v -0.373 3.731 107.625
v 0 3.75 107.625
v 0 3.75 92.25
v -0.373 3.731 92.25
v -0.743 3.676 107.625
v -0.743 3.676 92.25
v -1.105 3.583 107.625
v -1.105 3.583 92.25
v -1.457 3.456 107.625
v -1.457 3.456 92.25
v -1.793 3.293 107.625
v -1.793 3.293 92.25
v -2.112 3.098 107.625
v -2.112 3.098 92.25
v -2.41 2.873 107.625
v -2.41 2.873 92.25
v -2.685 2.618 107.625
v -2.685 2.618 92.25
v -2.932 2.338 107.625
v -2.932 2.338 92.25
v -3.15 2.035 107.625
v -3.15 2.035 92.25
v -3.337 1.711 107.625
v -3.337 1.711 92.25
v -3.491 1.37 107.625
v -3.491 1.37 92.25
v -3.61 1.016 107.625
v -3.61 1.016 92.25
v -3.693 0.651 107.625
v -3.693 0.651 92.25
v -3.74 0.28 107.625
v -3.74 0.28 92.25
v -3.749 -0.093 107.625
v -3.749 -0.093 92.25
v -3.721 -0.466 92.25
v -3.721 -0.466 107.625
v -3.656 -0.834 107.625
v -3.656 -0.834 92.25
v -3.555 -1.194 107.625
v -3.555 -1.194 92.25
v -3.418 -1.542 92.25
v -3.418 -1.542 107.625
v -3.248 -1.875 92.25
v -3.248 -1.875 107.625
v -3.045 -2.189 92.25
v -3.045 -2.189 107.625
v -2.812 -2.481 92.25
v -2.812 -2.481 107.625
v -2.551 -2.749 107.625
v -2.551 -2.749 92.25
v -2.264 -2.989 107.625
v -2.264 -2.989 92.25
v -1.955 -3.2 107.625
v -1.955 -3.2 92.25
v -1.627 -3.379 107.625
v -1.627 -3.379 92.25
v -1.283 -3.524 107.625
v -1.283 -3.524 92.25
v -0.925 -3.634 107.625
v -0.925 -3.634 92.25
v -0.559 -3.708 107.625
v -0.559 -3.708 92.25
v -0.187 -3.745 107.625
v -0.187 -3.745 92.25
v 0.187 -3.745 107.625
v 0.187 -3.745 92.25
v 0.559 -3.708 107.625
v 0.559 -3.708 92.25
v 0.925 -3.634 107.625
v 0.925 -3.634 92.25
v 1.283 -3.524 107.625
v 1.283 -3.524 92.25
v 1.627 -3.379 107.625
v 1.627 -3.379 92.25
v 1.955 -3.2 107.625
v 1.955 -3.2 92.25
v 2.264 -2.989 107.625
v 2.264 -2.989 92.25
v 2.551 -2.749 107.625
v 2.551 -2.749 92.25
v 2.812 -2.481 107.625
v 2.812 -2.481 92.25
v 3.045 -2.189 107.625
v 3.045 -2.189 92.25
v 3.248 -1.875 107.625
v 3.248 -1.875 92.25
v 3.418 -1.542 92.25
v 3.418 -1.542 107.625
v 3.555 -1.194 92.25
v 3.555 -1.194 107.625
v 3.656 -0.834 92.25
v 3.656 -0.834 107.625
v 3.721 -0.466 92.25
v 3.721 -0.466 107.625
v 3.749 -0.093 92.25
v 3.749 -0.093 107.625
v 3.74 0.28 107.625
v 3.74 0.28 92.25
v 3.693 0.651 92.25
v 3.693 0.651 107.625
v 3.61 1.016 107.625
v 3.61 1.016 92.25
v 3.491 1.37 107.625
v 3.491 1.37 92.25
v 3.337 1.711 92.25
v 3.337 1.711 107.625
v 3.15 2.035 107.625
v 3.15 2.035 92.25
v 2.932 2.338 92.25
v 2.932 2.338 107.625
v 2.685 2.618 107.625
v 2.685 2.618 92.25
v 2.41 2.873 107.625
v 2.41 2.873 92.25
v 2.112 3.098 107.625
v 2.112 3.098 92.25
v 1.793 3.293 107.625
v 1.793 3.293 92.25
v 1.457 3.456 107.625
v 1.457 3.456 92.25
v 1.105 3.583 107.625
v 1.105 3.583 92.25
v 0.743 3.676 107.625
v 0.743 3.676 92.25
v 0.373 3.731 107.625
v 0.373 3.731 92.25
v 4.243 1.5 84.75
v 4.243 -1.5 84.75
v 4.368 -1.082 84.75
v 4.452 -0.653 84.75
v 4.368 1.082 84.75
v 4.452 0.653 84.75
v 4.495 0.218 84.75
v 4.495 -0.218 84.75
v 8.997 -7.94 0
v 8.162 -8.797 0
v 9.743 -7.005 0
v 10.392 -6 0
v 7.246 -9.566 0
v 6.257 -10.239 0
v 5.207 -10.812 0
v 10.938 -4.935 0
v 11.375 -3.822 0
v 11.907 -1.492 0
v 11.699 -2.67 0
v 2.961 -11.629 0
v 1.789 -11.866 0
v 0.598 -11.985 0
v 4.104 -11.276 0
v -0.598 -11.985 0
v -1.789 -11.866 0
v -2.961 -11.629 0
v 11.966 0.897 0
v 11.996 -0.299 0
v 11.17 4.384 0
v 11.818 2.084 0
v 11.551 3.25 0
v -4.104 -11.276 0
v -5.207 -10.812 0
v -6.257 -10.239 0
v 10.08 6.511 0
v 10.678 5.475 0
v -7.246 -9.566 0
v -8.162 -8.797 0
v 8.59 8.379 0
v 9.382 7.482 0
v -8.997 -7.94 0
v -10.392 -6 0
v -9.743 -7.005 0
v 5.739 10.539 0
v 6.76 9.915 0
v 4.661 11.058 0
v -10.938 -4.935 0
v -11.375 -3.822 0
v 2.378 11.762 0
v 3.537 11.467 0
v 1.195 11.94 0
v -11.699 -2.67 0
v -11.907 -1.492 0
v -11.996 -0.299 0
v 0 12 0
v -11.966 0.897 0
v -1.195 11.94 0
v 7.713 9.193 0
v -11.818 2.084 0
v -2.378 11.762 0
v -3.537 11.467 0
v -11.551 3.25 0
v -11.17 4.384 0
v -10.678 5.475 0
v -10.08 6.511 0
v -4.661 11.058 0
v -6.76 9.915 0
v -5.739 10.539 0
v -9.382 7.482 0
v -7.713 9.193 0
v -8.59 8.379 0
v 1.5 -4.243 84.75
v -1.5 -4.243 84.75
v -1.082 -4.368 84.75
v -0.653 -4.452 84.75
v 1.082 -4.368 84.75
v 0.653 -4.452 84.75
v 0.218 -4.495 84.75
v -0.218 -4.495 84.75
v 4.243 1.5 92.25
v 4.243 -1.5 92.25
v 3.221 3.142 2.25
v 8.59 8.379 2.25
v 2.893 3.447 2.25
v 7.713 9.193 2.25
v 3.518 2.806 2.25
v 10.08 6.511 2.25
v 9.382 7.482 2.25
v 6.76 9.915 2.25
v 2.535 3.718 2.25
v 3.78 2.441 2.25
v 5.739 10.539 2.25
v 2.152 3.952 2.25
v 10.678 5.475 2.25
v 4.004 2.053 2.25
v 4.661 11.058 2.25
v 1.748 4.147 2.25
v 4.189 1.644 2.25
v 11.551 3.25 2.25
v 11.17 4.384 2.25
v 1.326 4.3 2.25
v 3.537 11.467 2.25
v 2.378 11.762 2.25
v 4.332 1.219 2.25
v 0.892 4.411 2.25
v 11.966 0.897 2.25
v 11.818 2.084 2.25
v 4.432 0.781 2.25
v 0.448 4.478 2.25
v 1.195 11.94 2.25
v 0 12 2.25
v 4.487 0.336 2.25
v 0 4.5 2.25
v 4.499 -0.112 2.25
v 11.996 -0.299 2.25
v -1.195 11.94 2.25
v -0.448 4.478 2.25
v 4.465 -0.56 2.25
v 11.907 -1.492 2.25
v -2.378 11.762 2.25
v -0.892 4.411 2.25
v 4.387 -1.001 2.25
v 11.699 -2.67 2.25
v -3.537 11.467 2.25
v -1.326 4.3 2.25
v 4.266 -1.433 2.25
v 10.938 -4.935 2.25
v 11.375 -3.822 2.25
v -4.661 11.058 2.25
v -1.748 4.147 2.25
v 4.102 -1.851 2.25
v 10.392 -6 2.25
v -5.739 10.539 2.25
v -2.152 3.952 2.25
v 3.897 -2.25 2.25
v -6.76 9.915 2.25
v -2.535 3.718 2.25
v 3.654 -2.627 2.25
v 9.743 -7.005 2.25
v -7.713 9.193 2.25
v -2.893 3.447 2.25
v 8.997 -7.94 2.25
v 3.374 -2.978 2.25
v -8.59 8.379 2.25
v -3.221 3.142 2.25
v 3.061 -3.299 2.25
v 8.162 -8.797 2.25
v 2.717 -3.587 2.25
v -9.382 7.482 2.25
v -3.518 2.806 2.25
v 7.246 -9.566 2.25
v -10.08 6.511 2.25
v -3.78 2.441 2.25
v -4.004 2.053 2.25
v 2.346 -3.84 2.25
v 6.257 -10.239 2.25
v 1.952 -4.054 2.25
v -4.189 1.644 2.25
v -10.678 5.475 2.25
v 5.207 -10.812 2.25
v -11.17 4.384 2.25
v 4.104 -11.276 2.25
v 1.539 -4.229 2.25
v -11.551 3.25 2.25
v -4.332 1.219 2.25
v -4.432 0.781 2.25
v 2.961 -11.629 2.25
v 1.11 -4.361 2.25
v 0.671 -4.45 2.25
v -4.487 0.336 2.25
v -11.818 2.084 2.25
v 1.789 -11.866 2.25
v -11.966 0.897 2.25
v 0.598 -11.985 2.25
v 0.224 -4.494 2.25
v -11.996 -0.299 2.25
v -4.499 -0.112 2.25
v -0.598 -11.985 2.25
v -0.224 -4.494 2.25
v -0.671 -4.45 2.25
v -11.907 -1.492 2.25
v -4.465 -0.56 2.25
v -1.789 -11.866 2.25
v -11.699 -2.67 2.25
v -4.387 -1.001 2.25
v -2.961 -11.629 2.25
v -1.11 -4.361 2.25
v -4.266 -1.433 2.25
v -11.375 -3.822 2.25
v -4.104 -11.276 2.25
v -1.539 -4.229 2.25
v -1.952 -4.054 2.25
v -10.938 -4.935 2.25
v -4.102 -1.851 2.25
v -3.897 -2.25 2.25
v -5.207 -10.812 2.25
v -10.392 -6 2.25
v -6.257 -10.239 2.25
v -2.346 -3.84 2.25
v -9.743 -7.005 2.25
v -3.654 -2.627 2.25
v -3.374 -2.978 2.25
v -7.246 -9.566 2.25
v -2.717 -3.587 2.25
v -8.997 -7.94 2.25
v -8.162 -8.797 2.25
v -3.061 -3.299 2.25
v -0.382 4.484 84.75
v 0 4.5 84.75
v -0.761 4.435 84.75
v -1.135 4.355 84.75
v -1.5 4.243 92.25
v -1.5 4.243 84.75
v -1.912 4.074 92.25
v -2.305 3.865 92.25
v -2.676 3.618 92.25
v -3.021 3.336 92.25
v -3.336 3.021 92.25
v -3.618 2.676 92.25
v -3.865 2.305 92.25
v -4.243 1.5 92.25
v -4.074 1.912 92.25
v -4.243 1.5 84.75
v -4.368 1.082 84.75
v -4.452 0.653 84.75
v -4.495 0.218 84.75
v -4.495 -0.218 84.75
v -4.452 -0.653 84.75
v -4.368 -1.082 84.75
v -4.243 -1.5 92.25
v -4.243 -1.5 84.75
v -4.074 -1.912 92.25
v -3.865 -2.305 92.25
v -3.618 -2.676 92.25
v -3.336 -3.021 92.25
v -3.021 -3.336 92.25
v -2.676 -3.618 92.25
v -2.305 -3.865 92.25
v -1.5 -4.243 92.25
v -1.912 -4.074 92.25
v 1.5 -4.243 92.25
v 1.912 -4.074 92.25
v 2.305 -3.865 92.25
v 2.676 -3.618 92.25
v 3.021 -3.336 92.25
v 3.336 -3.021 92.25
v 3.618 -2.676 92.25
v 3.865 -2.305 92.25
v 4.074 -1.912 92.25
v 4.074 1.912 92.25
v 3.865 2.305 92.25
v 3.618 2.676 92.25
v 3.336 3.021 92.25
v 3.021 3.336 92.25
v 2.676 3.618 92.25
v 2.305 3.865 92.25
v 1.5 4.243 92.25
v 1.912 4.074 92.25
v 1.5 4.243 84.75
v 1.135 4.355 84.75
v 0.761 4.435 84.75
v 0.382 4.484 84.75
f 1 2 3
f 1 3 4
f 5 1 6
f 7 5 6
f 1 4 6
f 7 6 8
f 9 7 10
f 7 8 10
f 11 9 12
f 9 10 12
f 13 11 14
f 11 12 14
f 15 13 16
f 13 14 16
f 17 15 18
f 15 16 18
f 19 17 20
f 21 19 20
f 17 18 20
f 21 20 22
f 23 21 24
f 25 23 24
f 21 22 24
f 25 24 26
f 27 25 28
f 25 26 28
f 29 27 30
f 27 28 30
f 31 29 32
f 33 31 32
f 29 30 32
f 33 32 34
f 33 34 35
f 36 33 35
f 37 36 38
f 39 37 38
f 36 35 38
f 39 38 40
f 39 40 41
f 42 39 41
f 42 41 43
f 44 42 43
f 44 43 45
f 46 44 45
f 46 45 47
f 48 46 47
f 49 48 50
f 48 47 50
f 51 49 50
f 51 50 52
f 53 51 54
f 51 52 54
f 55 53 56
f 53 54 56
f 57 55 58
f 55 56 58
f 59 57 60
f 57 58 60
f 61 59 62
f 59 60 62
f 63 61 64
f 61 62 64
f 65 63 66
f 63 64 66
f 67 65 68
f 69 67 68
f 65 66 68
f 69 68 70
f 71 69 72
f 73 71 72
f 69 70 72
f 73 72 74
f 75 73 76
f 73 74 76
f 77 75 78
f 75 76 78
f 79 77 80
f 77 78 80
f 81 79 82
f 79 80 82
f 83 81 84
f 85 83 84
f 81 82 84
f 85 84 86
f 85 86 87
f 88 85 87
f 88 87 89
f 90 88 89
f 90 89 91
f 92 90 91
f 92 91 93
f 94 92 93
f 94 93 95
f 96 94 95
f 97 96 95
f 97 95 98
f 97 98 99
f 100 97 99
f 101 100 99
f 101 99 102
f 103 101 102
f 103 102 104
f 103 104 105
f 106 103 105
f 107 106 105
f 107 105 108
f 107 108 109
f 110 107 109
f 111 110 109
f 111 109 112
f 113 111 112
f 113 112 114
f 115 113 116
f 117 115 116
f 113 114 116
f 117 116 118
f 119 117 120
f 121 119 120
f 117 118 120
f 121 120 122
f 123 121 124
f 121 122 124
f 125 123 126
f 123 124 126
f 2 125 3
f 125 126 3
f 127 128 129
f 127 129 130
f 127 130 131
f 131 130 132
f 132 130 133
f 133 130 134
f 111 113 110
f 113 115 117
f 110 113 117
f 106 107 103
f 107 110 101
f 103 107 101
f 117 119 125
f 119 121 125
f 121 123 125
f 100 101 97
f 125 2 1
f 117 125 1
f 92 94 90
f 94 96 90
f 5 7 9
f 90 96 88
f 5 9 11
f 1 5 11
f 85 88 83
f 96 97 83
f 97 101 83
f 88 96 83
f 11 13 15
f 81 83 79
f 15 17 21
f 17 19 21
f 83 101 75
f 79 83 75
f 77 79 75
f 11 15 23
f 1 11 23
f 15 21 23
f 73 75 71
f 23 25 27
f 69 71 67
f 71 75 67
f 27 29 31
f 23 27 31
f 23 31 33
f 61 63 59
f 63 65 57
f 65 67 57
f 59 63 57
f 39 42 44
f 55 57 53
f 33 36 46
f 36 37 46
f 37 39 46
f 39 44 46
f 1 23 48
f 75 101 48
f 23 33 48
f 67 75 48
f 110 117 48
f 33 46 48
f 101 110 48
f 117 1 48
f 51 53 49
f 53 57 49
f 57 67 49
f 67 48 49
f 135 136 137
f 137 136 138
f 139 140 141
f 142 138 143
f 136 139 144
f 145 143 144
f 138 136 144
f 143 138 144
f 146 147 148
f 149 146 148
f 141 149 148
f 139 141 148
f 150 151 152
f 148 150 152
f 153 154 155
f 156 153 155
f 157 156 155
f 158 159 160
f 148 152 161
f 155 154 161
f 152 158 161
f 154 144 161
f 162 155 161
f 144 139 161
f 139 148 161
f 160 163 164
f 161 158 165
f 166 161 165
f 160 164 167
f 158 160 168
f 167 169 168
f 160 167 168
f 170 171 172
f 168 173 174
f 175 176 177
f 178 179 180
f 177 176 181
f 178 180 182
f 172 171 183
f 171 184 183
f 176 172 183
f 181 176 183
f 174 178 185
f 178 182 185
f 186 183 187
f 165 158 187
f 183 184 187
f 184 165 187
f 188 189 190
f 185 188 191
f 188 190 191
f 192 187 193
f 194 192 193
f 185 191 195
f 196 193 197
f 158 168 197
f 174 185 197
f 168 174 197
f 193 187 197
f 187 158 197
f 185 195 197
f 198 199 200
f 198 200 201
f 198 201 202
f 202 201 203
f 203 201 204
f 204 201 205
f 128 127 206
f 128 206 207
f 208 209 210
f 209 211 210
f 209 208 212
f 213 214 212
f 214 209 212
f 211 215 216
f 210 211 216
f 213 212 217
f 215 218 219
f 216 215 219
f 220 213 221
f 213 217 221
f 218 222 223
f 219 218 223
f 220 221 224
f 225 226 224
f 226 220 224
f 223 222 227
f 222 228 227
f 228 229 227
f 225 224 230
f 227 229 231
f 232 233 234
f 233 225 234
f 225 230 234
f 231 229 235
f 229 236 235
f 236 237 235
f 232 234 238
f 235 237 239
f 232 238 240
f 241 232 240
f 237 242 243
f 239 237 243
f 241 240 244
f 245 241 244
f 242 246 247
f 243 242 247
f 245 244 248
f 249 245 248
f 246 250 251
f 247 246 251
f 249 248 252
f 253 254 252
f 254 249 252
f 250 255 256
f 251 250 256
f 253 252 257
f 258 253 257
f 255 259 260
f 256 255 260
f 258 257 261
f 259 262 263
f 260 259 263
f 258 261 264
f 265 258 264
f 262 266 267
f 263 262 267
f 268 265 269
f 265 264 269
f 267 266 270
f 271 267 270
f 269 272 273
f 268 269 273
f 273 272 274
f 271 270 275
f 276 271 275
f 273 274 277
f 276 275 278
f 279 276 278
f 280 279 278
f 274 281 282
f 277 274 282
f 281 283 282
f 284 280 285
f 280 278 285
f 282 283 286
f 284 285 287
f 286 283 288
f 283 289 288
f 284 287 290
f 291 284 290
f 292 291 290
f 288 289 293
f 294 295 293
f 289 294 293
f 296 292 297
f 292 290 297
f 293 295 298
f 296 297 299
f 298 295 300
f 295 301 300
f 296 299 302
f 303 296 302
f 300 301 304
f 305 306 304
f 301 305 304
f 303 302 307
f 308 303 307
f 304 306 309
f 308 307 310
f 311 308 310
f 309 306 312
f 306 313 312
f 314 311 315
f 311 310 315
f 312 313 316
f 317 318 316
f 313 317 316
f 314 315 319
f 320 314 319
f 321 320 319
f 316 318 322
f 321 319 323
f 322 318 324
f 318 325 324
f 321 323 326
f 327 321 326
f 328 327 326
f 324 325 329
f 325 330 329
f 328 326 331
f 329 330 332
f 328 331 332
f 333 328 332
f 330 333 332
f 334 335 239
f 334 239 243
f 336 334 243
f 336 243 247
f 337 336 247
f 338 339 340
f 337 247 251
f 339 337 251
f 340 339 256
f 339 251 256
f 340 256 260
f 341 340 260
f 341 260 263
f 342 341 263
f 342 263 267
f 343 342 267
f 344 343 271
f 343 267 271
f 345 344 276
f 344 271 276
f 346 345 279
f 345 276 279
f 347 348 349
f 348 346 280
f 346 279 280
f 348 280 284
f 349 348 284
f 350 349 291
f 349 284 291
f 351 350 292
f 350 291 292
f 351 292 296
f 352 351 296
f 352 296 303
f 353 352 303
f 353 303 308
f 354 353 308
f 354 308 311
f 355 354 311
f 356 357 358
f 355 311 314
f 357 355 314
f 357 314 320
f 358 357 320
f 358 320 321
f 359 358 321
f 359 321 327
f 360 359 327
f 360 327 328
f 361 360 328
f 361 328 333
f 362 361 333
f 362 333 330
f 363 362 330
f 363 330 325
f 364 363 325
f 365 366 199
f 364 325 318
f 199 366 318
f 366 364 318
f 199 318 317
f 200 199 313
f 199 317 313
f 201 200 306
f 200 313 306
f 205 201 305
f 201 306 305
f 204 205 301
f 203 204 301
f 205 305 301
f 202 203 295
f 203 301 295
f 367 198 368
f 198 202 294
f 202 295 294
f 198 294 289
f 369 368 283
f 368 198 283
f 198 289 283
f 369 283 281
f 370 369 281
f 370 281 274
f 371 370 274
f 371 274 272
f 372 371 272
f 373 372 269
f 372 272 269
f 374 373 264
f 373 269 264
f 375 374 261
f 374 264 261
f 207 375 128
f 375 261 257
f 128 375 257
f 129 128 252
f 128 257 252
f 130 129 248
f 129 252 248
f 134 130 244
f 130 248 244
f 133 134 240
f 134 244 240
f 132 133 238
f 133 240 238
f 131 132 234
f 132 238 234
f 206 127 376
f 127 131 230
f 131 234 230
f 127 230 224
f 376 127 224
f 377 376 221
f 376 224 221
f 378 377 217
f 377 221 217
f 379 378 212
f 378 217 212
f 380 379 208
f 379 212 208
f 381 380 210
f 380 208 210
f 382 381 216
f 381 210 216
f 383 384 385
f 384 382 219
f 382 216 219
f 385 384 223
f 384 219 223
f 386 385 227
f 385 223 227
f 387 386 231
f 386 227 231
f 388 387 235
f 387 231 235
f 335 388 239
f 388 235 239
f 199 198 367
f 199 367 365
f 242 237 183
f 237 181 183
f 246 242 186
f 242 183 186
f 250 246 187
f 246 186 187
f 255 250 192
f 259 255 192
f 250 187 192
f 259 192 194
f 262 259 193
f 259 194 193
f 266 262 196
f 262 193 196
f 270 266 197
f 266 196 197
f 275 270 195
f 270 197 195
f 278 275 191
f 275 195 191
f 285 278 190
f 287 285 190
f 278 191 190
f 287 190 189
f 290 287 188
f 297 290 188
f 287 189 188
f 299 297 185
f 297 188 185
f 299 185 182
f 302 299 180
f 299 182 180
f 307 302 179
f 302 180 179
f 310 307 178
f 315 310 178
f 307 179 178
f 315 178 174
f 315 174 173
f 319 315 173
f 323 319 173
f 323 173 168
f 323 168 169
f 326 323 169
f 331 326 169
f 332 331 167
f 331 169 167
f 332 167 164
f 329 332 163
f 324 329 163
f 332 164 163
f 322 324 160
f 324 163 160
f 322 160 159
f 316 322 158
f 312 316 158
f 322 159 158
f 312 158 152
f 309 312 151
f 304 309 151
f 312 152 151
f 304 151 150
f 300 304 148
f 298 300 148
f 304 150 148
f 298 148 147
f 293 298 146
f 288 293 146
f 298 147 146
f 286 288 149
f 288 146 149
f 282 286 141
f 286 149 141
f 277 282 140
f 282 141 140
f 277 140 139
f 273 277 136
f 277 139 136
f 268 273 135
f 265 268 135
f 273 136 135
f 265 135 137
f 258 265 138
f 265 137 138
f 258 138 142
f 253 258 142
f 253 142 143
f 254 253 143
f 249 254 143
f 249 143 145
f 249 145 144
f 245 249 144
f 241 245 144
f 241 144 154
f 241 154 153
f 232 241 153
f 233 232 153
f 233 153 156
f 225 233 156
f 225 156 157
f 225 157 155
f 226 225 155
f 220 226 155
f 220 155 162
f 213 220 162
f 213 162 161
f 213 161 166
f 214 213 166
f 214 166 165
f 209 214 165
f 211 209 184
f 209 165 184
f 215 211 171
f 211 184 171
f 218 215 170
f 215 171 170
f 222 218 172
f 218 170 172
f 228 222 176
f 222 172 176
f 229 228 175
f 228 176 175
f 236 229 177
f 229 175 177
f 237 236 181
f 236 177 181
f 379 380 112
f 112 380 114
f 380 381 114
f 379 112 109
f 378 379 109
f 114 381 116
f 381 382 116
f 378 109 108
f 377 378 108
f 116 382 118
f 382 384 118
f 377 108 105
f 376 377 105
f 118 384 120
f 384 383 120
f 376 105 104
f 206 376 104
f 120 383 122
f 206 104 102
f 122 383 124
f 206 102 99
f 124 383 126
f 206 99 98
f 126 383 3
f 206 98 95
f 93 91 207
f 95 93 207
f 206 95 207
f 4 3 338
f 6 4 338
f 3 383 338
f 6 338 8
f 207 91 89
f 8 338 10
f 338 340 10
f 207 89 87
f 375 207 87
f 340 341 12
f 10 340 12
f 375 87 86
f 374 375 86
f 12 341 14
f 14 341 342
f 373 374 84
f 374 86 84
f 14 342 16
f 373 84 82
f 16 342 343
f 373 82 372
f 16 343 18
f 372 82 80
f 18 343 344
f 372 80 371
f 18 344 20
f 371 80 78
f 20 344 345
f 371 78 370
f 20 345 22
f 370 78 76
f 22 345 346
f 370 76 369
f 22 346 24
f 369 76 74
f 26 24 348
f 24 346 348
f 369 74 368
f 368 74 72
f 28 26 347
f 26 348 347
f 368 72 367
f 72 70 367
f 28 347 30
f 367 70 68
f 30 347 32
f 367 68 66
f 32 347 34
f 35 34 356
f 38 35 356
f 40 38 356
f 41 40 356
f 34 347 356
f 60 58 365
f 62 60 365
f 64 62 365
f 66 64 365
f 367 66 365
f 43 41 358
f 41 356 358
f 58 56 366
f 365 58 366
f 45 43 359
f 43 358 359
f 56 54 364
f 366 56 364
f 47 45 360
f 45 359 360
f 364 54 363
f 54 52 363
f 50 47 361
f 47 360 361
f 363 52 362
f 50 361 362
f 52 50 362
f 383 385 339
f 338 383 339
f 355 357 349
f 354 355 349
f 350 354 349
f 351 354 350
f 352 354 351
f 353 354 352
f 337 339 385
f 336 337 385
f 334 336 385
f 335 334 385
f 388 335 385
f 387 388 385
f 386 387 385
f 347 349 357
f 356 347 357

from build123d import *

# Parameters (mm, degrees)
CUT_EXTRUDE_START        = -10
CUT_EXTRUDE_1_DEPTH      = 10
PATTERN_CIRCULAR_1_COUNT = 4
SCALE_1_SCALE            = 0.75


with BuildPart() as part:
    # 草图2 → 旋转1 (revolve)
    with BuildSketch(Plane(origin=(0, 0, 0), x_dir=(0, 0, -1), z_dir=(1, 0, 0))):
        Polygon((0, 0), (-143.5, 0), (-143.5, 5), (-123, 5), (-123, 6), (-3, 6), (-3, 16), (0, 16), align=None)
    revolve(axis=Axis((0, 0, 0), (0, 0, 1)))

    # 草图7 → 切除-拉伸1 (cut)
    with BuildSketch(Plane.XY.offset(123).offset(CUT_EXTRUDE_START)):
        with BuildLine():
            Line((5.656854249, 2), (5.656854249, -2))
            ThreePointArc((5.656854249, -2), (6, 0), (5.656854249, 2))
        make_face()
        with BuildLine():
            Line((-5.656854249, 2), (-5.656854249, -2))
            ThreePointArc((-5.656854249, -2), (-6, 0), (-5.656854249, 2))
        make_face()
    cut_extrude_1 = extrude(amount=CUT_EXTRUDE_1_DEPTH, mode=Mode.SUBTRACT)

    # 阵列(圆周)1: 切除-拉伸1 ×4 about axis
    pattern_circular_1_axis = Axis((0, 0, 0), (0, 0, -1))
    for i in range(1, PATTERN_CIRCULAR_1_COUNT):
        add(cut_extrude_1.rotate(pattern_circular_1_axis, i * 360 / PATTERN_CIRCULAR_1_COUNT), mode=Mode.SUBTRACT)


with BuildPart() as part_1:
    # 缩放比例1: scaled about (0, 0, 0)
    add(part.part.scale(SCALE_1_SCALE))


solid = part_1.part
